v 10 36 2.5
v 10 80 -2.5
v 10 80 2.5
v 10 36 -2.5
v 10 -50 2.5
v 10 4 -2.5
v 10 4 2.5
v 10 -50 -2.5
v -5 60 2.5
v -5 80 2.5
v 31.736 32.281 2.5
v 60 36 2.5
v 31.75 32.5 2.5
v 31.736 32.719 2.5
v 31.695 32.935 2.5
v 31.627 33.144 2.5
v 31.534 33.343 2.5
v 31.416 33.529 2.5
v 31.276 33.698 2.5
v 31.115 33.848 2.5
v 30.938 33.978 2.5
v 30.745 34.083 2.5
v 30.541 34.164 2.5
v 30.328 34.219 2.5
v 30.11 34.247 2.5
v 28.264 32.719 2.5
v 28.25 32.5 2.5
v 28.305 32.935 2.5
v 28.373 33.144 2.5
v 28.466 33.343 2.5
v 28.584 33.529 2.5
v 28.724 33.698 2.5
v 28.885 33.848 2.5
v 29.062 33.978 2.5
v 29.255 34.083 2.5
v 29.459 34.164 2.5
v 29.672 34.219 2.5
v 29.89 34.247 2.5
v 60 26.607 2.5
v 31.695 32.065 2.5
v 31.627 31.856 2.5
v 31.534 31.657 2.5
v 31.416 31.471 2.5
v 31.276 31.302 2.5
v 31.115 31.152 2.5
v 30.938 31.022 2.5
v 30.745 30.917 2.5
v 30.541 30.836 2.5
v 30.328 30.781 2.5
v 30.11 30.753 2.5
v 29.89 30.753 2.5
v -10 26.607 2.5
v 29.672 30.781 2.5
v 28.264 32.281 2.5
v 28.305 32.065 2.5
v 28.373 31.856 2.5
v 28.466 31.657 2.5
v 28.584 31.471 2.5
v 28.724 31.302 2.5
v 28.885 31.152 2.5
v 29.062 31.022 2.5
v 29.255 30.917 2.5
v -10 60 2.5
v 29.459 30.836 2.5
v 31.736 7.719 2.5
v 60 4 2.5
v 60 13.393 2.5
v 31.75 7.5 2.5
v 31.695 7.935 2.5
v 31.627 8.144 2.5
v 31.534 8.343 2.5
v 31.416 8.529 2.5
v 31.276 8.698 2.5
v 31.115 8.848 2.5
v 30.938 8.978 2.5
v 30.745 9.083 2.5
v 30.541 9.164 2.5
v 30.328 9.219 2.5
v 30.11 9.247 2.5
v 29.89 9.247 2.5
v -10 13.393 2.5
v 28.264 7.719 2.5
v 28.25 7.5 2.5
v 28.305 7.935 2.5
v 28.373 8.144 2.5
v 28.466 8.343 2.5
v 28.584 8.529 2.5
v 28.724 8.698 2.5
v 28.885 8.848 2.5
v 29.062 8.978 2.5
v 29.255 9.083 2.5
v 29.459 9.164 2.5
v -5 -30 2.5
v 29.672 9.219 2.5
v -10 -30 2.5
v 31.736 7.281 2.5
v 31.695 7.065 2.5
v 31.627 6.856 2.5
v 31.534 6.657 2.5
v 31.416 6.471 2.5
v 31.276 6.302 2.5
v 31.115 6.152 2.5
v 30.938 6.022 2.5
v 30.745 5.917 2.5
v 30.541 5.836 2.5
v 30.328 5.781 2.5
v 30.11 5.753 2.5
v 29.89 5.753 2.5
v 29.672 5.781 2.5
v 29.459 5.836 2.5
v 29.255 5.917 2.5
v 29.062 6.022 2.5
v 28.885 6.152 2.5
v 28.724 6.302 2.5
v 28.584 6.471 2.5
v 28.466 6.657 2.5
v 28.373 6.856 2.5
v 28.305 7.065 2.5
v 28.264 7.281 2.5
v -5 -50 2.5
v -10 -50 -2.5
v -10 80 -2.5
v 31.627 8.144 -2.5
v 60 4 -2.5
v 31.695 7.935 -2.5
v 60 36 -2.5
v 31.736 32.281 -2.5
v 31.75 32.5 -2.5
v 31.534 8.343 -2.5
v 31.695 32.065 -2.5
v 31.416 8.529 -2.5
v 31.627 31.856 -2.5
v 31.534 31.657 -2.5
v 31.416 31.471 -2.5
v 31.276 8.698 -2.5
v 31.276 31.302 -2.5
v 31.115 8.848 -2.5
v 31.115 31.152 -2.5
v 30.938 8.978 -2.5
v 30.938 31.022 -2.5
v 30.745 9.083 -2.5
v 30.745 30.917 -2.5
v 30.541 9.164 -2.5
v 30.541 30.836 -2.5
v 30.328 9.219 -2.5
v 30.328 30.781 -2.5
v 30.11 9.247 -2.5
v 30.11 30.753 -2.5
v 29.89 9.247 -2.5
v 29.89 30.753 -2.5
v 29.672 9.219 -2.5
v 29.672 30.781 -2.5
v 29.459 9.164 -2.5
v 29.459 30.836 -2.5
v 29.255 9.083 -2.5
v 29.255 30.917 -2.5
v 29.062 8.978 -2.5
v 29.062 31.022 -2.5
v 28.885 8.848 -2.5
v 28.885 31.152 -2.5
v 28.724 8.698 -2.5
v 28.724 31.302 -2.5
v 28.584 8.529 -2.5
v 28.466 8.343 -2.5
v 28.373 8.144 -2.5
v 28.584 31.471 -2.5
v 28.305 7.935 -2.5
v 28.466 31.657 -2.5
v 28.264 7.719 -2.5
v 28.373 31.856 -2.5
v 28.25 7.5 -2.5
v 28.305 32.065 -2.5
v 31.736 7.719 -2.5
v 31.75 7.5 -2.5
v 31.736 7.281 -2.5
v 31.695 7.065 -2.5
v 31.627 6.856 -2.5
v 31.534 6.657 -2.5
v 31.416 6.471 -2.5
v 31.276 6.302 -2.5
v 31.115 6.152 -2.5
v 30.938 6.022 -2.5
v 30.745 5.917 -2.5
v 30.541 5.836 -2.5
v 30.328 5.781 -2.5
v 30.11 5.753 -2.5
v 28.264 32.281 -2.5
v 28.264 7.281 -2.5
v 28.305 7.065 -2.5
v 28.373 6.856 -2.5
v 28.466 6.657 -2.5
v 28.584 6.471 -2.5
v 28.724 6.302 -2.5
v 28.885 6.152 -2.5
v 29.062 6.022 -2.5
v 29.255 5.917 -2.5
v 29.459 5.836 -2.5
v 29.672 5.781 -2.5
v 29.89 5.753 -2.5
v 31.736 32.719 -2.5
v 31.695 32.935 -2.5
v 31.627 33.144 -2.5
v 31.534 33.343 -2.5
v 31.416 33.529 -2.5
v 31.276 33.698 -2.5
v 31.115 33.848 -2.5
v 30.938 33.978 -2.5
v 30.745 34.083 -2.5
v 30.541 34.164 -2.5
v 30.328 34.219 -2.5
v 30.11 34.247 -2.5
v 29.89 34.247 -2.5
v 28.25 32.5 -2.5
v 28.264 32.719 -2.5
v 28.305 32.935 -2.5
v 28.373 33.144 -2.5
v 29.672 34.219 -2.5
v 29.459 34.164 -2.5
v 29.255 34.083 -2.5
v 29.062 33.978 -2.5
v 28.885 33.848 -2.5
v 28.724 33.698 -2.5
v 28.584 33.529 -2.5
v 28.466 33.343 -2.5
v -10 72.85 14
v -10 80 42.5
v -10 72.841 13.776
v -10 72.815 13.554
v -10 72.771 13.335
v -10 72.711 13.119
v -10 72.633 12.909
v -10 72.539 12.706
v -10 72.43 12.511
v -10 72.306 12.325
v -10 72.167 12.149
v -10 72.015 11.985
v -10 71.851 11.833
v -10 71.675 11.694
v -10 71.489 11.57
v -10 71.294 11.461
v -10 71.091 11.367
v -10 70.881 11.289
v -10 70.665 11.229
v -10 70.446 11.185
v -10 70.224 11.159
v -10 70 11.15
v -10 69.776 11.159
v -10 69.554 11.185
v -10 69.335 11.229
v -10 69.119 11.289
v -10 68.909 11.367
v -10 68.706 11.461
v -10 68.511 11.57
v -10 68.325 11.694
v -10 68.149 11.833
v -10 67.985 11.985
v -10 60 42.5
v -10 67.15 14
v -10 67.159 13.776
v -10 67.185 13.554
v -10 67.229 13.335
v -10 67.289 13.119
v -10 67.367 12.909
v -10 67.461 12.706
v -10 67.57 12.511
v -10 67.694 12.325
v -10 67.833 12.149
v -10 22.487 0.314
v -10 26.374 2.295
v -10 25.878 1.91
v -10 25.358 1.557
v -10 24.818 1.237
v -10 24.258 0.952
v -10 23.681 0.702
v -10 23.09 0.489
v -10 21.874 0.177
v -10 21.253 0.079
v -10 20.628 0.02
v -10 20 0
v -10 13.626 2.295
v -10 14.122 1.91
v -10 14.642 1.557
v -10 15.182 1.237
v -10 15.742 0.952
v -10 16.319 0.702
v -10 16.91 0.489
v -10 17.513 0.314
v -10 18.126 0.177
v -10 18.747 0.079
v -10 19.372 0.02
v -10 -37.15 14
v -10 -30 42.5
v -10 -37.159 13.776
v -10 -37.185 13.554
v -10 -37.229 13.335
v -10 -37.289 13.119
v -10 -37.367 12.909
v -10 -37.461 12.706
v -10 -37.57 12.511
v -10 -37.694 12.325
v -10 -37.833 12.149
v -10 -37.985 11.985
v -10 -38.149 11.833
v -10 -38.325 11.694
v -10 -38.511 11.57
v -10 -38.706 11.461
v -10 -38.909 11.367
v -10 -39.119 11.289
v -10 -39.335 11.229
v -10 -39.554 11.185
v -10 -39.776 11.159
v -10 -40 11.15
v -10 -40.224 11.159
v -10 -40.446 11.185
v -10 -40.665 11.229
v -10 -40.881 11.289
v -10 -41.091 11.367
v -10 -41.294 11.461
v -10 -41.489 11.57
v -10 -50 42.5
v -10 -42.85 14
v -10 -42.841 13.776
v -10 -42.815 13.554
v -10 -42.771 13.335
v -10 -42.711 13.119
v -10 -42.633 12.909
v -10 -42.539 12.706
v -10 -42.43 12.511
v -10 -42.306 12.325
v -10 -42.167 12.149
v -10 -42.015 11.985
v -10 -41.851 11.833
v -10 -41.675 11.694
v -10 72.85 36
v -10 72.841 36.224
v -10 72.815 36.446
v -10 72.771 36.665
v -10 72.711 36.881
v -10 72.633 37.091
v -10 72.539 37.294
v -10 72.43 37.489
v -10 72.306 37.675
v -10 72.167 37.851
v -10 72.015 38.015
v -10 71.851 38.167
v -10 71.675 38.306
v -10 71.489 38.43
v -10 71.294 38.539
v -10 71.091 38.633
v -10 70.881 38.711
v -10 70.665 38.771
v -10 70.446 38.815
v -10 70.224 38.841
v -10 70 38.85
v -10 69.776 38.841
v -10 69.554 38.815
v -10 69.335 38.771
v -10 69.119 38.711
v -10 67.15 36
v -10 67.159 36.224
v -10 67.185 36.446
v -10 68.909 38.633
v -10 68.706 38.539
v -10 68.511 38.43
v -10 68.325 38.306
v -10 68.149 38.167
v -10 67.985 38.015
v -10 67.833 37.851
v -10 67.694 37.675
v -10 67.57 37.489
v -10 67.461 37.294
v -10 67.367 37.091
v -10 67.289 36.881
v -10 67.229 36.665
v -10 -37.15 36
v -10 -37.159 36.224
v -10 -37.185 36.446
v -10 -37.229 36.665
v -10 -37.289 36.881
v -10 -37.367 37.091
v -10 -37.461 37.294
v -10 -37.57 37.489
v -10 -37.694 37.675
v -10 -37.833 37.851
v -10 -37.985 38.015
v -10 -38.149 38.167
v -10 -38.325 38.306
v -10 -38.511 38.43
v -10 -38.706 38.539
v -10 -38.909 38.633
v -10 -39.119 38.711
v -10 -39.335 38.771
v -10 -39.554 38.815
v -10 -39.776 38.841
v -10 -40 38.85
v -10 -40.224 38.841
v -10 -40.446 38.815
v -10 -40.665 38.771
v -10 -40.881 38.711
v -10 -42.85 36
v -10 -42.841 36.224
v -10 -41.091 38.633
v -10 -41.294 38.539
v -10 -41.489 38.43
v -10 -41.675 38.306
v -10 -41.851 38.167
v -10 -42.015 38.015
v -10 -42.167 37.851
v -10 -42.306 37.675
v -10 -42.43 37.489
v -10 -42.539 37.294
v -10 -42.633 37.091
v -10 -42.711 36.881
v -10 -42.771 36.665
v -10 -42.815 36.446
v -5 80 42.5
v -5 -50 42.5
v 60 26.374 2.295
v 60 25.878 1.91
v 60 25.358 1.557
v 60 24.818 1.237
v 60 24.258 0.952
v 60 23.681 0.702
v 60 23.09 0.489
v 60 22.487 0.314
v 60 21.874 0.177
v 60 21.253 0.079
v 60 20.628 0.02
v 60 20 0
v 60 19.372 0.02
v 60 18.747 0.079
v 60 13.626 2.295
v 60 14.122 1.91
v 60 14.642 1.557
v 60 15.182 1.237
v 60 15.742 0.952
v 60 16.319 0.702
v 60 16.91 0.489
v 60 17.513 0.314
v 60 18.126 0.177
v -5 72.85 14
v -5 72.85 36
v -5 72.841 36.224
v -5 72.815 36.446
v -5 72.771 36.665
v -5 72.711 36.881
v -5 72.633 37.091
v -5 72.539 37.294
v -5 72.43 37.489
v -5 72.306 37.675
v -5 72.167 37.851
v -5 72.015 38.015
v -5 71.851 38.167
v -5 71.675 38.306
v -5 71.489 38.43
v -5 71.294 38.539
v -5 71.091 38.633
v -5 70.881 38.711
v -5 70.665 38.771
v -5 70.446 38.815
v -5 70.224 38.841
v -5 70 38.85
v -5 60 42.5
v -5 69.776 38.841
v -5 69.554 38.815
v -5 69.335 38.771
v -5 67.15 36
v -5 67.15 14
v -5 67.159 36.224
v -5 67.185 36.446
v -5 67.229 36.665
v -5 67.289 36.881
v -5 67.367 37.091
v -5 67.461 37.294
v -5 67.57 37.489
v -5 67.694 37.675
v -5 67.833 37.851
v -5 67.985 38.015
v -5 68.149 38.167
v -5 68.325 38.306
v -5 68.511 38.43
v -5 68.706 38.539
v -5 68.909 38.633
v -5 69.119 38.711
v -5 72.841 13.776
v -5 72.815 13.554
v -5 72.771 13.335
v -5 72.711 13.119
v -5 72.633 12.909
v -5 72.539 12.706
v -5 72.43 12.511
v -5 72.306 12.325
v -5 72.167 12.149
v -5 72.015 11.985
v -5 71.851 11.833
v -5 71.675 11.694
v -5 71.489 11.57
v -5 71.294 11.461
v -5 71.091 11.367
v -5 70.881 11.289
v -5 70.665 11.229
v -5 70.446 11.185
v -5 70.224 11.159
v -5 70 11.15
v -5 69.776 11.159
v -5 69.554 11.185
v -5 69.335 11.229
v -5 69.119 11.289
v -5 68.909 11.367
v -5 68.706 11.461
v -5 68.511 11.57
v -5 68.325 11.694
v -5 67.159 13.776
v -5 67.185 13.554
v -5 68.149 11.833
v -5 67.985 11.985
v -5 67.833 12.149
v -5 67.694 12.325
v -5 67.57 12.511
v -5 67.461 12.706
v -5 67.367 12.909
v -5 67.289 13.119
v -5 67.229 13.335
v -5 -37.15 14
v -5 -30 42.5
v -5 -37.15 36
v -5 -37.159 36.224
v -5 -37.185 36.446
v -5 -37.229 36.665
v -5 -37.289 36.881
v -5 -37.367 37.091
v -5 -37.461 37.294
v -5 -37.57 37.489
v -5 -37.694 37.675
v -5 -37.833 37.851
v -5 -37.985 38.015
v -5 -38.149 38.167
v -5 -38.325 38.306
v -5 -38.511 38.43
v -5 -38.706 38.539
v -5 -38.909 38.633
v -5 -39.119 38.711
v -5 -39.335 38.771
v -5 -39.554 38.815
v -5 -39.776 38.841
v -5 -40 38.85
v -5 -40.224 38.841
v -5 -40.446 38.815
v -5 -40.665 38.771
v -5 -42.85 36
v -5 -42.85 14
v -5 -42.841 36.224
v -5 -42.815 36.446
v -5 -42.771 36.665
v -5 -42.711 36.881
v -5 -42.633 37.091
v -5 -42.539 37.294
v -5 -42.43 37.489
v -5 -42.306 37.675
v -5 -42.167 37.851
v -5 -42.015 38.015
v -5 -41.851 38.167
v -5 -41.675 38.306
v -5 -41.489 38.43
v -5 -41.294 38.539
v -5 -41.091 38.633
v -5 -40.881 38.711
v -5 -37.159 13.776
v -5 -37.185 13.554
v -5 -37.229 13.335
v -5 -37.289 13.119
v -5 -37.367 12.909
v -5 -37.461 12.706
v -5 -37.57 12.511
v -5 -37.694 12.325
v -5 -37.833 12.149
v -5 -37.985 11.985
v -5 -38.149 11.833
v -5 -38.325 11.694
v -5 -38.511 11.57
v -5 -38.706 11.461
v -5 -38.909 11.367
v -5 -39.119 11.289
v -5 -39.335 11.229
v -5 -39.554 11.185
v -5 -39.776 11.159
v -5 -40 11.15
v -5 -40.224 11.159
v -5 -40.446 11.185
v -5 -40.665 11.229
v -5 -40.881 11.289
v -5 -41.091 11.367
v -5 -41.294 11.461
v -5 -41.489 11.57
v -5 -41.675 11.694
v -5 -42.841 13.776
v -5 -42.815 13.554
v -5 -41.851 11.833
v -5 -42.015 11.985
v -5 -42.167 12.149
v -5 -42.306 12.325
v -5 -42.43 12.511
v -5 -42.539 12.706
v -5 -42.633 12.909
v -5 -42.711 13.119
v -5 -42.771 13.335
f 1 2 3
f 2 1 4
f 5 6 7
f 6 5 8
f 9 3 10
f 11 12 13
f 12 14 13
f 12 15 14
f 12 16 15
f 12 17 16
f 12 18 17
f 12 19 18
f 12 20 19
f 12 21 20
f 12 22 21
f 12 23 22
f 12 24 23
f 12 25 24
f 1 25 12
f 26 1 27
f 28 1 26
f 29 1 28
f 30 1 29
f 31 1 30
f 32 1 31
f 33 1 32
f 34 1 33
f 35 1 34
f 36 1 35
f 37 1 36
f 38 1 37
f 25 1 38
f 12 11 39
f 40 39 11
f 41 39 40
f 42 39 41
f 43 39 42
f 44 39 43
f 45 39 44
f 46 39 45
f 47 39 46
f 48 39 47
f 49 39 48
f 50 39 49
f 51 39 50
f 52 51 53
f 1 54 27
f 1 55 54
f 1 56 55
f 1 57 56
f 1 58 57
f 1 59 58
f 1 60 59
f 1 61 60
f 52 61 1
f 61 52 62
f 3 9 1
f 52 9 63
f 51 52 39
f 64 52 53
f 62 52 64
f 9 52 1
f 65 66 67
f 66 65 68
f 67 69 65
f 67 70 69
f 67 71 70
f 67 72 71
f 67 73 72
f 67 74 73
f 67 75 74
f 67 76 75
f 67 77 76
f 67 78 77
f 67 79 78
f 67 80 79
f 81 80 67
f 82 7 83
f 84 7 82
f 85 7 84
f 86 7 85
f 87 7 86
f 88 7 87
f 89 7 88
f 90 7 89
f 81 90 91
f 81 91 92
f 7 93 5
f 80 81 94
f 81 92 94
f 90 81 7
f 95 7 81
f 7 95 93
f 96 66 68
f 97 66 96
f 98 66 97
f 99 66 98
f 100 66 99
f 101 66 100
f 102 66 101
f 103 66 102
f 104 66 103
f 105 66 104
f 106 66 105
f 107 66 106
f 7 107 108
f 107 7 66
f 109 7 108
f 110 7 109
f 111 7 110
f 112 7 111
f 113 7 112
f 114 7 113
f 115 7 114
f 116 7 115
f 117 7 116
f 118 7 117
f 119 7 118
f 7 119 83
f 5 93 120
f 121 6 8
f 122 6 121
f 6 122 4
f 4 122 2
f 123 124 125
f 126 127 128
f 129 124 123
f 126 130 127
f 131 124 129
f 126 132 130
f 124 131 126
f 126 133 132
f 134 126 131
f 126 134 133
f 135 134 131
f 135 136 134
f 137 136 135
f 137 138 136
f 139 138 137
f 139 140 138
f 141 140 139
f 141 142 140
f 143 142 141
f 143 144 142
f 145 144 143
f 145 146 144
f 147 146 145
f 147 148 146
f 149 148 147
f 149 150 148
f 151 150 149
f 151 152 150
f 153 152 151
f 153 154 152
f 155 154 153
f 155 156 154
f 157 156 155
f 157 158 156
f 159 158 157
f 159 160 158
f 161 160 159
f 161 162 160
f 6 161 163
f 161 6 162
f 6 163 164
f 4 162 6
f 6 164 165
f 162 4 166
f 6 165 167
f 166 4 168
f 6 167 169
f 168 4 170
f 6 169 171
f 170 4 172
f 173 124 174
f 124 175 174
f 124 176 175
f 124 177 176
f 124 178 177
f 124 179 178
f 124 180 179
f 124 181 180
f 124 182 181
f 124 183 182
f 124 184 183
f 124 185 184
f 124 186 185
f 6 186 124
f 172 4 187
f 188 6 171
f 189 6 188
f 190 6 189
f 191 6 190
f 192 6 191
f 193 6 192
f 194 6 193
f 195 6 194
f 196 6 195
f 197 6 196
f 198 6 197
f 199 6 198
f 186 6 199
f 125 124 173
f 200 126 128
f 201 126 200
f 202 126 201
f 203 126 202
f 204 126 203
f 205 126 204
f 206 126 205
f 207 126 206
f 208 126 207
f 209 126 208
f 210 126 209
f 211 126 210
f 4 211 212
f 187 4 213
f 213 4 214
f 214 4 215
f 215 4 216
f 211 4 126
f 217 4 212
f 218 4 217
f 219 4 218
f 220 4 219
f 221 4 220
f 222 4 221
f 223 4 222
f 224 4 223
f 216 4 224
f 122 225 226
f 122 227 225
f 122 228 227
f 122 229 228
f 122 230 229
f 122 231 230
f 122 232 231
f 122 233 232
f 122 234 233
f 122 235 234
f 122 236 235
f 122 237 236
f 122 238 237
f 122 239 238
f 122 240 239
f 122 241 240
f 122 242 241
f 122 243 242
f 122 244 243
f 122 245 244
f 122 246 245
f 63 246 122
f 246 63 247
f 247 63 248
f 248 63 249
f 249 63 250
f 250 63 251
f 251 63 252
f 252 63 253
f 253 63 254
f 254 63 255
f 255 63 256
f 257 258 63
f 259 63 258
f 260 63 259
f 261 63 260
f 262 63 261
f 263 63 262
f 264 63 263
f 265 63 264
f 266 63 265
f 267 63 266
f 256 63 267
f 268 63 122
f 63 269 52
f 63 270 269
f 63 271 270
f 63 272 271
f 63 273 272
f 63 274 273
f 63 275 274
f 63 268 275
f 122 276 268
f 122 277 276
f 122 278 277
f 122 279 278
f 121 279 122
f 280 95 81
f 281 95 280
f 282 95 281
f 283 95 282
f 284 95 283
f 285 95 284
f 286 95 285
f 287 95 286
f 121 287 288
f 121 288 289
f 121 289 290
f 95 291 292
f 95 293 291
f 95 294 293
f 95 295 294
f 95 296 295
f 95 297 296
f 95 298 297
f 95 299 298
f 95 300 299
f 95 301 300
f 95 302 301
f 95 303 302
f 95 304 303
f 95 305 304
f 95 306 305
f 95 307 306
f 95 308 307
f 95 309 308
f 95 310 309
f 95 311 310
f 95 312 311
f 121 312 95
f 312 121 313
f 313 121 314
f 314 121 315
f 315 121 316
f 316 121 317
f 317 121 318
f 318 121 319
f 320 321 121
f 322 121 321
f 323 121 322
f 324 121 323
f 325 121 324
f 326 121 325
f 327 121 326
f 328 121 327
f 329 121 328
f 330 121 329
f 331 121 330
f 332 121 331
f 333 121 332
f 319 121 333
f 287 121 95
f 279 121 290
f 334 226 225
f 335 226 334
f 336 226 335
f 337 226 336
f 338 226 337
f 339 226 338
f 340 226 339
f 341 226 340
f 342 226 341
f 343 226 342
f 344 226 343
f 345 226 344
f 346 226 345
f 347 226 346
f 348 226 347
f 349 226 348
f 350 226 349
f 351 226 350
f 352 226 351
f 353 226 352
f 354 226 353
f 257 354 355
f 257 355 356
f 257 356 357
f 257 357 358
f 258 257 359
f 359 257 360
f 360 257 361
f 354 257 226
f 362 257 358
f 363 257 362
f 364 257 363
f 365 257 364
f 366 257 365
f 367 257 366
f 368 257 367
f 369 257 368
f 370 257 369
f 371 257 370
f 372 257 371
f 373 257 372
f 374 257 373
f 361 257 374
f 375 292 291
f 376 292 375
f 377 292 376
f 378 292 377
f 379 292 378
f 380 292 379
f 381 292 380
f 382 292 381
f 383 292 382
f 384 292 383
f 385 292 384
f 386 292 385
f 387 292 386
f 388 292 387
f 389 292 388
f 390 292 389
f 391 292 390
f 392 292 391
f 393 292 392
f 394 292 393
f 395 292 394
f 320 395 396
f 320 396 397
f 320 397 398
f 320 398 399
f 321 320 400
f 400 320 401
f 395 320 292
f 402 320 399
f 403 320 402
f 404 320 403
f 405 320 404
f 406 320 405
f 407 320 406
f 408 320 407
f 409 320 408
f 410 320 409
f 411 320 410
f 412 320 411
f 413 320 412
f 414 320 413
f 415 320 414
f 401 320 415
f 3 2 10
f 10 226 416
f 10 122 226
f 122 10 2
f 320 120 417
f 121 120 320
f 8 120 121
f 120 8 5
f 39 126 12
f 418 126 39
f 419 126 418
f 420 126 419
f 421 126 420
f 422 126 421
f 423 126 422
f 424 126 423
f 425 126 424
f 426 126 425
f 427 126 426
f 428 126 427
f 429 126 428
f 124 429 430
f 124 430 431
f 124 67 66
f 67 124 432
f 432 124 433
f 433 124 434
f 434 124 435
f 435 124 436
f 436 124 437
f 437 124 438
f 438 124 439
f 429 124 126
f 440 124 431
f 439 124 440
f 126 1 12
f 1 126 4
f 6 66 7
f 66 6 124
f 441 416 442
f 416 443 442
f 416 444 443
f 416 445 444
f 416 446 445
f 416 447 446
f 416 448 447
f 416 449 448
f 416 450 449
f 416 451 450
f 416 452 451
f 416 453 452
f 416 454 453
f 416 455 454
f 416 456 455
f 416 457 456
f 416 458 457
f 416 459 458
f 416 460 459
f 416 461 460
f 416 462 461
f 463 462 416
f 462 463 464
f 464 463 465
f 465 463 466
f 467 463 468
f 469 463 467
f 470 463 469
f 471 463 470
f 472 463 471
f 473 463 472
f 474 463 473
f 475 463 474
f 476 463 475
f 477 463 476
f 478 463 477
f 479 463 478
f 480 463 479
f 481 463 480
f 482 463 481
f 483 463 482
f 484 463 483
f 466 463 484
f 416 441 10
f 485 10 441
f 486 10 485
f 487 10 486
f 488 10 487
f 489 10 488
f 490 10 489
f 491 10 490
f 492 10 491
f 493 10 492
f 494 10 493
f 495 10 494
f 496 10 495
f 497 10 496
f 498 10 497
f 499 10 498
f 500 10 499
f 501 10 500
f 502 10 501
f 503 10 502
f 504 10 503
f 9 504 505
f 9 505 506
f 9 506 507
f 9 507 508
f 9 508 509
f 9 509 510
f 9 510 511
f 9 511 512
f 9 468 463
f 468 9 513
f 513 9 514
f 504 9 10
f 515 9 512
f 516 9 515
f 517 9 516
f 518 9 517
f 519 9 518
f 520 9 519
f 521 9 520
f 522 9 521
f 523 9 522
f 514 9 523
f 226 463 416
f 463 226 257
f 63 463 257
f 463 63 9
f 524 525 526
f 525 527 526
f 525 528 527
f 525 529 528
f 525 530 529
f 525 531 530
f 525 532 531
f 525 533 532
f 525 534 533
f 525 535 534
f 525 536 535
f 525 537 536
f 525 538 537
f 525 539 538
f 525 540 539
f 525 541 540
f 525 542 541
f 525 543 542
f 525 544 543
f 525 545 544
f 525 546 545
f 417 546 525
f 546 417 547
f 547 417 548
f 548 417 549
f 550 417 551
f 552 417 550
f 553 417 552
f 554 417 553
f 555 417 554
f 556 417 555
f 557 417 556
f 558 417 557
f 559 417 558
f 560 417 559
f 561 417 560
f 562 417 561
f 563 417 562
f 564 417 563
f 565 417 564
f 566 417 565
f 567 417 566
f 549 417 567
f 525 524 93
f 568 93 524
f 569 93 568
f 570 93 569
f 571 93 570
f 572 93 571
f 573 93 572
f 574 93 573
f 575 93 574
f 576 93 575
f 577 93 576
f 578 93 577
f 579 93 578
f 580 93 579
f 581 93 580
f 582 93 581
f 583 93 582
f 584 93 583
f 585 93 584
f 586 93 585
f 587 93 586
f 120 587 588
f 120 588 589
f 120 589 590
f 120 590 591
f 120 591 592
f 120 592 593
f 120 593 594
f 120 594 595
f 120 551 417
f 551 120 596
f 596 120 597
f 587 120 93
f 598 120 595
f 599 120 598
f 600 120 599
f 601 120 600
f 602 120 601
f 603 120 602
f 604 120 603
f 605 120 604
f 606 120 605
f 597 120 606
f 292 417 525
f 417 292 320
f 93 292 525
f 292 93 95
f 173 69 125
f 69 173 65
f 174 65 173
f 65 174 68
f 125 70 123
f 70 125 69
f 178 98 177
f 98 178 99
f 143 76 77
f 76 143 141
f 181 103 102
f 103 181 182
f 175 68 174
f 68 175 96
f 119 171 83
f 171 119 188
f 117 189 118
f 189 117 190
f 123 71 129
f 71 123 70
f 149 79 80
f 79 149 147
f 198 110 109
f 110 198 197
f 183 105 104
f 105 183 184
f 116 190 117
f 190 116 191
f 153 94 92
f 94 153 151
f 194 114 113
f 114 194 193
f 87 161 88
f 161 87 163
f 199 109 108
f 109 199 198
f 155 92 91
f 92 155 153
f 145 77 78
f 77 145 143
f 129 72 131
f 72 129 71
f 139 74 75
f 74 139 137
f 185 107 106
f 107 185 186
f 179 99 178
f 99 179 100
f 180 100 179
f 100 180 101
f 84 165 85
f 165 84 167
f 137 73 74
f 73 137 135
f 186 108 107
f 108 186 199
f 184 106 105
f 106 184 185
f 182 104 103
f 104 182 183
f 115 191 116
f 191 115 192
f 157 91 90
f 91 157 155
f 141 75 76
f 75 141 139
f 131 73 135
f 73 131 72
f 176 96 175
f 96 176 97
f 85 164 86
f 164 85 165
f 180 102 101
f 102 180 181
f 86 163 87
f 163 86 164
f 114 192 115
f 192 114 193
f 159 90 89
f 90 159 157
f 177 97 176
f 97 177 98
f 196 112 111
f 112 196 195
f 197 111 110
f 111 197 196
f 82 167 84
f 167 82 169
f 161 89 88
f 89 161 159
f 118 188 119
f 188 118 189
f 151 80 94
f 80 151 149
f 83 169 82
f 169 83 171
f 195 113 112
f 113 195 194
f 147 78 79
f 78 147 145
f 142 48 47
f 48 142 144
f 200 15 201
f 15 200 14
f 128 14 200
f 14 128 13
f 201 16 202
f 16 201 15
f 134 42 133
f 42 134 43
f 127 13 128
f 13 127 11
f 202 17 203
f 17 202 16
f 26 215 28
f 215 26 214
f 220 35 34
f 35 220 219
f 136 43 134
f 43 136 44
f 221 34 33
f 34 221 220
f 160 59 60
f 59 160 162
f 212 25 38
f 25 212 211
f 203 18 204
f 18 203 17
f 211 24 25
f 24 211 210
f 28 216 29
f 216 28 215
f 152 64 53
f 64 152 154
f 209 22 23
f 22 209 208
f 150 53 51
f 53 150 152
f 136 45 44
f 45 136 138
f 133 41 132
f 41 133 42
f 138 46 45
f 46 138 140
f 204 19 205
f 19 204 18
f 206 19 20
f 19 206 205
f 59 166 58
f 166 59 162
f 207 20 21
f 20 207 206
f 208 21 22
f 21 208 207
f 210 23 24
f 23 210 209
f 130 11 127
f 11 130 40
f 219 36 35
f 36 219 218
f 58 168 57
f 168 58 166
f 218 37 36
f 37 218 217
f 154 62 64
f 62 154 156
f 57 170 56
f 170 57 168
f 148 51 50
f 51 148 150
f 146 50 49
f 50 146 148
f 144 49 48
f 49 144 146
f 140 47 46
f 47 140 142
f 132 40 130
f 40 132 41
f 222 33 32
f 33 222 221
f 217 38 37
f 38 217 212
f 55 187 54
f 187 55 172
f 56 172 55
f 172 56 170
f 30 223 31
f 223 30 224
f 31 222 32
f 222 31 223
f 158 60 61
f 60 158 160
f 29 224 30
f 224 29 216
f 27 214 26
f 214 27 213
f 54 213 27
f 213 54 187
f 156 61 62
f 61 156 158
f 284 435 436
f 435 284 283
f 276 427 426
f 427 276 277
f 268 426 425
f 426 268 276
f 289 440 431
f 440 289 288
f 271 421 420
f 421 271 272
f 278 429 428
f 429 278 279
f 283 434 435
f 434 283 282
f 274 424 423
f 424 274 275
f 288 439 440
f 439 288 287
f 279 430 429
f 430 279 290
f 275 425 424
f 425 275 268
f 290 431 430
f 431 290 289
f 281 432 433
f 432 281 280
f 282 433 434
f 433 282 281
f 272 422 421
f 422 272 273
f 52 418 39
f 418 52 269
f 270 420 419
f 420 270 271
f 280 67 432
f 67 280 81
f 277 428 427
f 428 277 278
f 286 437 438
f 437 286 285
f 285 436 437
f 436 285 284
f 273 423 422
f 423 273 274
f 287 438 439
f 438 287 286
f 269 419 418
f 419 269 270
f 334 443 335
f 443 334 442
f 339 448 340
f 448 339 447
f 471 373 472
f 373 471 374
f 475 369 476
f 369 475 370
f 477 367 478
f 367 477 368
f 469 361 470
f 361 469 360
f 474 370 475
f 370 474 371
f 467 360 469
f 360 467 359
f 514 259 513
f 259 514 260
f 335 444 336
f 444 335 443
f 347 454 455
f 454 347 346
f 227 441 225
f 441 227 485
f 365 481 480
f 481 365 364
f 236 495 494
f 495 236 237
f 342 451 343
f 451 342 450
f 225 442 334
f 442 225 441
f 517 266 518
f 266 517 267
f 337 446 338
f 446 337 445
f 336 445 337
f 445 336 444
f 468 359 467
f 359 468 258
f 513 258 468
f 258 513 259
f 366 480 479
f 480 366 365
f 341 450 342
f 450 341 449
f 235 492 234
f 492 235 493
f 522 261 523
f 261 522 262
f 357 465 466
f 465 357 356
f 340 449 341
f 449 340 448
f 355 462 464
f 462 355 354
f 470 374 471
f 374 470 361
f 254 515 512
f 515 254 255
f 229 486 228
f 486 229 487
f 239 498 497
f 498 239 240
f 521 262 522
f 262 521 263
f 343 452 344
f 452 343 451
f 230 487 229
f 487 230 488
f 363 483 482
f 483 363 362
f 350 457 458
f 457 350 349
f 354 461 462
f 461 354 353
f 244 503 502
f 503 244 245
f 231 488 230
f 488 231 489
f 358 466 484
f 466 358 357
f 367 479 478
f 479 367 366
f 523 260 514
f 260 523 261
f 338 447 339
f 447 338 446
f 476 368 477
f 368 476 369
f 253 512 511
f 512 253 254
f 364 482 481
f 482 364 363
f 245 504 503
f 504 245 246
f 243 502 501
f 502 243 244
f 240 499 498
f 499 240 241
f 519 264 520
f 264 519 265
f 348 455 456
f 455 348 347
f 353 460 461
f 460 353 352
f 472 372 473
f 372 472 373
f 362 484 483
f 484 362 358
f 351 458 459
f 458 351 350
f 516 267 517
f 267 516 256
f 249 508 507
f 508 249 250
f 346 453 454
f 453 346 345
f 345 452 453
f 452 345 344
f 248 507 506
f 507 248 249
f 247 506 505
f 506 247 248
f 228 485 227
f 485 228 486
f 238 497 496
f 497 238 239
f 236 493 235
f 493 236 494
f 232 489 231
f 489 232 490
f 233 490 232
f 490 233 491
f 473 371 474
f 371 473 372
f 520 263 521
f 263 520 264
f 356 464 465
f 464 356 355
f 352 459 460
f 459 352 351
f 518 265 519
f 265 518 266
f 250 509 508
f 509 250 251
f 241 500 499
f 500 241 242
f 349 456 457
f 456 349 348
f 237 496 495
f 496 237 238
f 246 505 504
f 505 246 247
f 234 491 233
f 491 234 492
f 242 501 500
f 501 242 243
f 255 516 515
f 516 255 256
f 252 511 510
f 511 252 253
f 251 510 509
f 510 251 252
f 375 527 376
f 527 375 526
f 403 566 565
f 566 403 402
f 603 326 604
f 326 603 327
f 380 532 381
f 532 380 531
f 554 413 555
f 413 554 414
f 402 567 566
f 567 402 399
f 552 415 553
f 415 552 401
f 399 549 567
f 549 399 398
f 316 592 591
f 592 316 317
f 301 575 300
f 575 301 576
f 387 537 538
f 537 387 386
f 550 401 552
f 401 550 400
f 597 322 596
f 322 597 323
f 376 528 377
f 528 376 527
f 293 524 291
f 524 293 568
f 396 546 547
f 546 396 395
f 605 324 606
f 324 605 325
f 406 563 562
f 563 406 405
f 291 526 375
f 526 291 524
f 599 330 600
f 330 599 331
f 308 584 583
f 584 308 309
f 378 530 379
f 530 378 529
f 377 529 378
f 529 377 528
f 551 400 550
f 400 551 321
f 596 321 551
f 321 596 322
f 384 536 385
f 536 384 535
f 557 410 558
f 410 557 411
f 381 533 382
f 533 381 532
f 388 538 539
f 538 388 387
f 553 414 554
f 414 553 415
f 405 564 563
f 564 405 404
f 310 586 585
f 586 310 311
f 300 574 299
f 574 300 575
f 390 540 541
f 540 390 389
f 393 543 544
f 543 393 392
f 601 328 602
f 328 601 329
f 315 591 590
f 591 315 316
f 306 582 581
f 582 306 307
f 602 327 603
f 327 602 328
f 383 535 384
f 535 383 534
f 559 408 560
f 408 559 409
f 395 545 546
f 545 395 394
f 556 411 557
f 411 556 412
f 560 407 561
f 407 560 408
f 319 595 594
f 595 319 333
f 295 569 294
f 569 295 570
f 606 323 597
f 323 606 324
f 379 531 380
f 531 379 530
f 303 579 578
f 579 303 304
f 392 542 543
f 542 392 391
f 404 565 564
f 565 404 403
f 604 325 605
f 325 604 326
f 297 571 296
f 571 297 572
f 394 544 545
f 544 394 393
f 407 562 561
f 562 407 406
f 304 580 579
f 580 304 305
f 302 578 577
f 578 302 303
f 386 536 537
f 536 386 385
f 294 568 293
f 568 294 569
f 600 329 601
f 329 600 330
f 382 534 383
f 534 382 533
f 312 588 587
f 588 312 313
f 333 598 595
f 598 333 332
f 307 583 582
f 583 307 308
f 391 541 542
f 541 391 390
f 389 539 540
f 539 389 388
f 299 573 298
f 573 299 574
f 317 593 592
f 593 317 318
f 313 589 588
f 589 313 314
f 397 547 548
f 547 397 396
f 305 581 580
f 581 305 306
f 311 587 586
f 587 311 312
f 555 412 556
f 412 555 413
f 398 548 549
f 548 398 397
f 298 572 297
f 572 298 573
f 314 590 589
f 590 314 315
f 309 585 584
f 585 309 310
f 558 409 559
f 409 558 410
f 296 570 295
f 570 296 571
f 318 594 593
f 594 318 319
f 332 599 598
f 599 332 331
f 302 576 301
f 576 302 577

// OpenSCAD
difference(){
union(){
translate([0,15,0])cube([20,130,5],center=true);
translate([35,20,0])cube([50,32,5],center=true);
translate([-7.5,70,20])cube([5,20,45],center=true);
translate([-7.5,-40,20])cube([5,20,45],center=true);
}
translate([-15,20,10])rotate([0,90,0])cylinder(d=20,h=100,$fn=100);
translate([-12,70,14])
hull(){
    rotate([0,90,0])cylinder(d=5.7,h=10,$fn=80);
translate([0,0,22])rotate([0,90,0])cylinder(d=5.7,h=10,$fn=80);    
}
translate([-12,-40,14])
hull(){
    rotate([0,90,0])cylinder(d=5.7,h=10,$fn=80);
translate([0,0,22])rotate([0,90,0])cylinder(d=5.7,h=10,$fn=80);    
}
translate([30,7.5,-10]){
cylinder(d=3.5,h=20,$fn=50);
translate([0,25,0])cylinder(d=3.5,h=20,$fn=50);
}
}
